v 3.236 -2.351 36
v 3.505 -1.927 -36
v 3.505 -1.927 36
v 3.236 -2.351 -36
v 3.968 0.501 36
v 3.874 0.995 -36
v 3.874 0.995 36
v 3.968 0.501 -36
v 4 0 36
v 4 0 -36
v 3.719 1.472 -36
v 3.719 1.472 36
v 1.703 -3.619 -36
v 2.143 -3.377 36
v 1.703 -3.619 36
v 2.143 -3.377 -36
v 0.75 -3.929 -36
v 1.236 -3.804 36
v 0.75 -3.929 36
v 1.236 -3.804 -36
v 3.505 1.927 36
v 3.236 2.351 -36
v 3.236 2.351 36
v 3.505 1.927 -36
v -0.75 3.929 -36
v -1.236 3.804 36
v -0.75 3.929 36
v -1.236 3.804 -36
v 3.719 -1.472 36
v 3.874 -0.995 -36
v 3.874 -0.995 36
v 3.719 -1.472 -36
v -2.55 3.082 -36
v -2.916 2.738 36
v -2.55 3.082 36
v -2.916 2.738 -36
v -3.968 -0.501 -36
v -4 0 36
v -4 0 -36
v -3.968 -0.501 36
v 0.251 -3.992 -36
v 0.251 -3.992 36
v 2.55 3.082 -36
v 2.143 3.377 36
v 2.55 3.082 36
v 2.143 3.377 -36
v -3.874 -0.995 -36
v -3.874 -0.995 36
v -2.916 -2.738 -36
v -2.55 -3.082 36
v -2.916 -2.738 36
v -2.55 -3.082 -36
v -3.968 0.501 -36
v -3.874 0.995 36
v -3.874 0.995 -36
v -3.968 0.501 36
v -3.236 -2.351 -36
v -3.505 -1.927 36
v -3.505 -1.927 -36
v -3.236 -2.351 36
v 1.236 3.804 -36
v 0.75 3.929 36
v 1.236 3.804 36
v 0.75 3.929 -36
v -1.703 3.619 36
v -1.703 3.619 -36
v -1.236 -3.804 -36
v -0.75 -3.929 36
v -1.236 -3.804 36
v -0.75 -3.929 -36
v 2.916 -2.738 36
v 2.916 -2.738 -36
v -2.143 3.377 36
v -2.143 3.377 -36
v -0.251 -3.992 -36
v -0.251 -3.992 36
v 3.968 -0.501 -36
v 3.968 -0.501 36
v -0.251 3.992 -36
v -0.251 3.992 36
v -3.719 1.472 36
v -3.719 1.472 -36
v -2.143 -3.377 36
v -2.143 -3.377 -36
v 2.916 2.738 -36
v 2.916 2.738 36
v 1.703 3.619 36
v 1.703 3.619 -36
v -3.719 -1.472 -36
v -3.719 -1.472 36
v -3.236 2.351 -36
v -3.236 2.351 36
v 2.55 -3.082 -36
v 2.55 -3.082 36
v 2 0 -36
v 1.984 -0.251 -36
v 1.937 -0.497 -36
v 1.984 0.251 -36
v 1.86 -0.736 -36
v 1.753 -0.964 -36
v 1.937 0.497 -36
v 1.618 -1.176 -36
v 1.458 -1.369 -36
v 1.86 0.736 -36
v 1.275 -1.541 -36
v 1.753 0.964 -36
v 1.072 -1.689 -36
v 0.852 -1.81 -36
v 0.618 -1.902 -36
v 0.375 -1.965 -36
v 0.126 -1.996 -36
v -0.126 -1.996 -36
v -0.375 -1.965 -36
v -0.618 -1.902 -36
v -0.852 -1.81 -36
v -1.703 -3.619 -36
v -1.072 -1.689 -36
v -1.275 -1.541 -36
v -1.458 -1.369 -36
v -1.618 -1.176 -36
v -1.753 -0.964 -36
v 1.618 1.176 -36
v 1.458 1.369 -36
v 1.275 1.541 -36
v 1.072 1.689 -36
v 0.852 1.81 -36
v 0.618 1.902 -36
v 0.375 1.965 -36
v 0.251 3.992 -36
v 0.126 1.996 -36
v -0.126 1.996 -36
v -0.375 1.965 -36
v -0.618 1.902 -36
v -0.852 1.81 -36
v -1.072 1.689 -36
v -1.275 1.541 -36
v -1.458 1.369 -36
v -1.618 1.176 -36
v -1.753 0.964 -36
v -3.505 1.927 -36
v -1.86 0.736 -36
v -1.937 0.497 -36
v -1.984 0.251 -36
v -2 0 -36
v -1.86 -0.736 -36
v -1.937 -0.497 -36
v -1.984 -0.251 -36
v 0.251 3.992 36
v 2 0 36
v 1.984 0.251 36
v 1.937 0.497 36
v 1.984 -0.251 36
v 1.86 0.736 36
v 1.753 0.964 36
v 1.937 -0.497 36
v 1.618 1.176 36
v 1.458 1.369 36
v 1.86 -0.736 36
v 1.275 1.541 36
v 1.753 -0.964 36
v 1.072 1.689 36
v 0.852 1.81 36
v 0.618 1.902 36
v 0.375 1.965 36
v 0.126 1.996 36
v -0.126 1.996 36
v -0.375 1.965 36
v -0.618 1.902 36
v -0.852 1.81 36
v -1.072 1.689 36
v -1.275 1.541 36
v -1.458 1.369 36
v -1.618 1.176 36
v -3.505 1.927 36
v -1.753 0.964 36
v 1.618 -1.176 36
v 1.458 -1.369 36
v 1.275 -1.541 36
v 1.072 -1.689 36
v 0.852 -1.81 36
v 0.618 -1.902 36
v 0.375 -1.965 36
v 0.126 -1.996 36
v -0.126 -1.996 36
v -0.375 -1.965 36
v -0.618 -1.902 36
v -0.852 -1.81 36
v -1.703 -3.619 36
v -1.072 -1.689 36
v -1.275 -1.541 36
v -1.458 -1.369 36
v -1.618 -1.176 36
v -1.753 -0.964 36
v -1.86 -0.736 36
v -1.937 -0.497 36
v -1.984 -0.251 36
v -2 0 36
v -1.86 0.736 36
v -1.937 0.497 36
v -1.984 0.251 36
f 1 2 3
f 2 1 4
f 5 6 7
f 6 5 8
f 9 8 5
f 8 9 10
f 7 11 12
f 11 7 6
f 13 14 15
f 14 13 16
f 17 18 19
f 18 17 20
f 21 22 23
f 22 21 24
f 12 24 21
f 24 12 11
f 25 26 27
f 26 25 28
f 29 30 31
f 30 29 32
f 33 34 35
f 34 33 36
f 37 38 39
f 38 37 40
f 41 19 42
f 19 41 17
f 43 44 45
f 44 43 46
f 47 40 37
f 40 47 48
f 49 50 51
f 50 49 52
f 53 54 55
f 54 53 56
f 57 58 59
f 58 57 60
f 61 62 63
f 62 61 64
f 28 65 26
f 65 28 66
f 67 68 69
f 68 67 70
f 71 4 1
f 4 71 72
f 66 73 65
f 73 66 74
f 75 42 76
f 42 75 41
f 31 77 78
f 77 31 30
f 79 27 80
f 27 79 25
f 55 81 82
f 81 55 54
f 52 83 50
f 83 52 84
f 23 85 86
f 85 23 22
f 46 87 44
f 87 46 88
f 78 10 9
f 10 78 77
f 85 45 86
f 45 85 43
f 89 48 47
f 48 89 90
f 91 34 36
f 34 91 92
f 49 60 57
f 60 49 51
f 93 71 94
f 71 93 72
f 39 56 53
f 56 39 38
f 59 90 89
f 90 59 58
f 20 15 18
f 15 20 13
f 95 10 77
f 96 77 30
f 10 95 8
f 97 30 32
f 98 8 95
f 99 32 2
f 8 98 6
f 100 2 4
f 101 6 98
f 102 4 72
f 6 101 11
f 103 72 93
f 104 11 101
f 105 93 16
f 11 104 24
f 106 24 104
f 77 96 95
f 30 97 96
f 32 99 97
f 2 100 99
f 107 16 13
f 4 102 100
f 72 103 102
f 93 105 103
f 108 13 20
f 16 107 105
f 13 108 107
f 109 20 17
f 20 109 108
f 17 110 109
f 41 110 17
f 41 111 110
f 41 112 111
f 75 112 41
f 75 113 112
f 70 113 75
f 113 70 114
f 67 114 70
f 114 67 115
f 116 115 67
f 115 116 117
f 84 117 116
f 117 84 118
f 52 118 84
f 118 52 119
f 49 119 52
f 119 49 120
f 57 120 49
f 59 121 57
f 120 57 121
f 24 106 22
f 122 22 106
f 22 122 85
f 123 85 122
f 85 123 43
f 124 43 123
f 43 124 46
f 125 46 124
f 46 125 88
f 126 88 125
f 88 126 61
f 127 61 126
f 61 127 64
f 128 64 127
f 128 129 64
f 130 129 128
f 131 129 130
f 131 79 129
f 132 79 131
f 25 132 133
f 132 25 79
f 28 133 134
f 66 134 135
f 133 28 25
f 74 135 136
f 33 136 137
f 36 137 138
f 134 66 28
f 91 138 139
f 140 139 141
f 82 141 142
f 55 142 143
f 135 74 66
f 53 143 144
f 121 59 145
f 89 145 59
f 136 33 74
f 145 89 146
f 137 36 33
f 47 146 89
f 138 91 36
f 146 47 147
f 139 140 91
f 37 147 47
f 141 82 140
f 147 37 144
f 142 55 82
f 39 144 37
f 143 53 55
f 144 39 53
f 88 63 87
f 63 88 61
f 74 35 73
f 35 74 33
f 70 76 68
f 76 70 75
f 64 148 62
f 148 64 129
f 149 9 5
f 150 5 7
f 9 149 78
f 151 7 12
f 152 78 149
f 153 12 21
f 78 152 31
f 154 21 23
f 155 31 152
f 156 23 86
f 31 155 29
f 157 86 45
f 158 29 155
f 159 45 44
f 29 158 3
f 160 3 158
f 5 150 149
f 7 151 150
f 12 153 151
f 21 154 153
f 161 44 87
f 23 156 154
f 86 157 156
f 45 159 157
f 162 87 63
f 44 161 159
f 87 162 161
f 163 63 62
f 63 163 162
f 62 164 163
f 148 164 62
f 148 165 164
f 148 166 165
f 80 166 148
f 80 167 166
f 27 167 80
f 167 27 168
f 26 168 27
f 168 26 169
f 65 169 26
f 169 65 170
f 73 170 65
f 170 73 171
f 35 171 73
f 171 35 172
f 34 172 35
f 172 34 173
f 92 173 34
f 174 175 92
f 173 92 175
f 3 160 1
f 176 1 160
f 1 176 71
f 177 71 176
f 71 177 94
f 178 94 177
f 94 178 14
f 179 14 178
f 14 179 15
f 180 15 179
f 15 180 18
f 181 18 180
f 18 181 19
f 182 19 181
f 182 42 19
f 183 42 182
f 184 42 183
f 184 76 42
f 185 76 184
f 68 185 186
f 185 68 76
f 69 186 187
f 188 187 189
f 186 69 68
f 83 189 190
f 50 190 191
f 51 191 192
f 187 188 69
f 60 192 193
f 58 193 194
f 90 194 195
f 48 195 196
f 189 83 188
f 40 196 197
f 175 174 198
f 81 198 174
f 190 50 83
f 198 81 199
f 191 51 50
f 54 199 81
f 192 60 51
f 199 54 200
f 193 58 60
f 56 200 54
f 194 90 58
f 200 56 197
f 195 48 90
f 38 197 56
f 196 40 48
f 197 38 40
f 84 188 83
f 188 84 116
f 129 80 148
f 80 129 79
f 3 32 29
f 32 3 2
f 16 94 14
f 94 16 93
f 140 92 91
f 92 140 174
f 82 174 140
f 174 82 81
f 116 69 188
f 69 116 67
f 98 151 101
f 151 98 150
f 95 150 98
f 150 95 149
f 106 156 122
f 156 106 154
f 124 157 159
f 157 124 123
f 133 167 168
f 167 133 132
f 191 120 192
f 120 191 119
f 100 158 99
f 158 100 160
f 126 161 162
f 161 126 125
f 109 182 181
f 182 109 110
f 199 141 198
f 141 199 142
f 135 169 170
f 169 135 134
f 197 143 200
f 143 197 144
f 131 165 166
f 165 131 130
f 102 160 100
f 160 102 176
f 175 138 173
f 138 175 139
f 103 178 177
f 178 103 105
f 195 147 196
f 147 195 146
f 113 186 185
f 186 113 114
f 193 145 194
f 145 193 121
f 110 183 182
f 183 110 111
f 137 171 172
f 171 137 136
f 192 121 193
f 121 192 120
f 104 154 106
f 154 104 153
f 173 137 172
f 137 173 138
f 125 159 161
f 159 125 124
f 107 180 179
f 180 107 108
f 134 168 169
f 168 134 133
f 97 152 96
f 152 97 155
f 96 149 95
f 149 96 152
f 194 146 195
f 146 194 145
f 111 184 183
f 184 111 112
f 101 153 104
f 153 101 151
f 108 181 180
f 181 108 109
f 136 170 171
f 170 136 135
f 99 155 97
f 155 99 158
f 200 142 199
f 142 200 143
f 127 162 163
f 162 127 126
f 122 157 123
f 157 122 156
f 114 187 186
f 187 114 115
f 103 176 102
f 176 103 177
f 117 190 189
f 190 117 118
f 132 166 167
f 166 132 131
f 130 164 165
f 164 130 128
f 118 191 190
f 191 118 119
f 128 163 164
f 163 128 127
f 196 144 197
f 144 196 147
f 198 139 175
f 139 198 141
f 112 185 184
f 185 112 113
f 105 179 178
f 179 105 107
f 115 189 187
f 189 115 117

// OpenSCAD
$fn = 50;


difference() {
	union() {
		translate(v = [0, 0, -36.0000000000]) {
			cylinder(h = 72, r = 4.0000000000);
		}
	}
	union() {
		translate(v = [0, 0, -100.0000000000]) {
			cylinder(h = 200, r = 2.0000000000);
		}
	}
}
